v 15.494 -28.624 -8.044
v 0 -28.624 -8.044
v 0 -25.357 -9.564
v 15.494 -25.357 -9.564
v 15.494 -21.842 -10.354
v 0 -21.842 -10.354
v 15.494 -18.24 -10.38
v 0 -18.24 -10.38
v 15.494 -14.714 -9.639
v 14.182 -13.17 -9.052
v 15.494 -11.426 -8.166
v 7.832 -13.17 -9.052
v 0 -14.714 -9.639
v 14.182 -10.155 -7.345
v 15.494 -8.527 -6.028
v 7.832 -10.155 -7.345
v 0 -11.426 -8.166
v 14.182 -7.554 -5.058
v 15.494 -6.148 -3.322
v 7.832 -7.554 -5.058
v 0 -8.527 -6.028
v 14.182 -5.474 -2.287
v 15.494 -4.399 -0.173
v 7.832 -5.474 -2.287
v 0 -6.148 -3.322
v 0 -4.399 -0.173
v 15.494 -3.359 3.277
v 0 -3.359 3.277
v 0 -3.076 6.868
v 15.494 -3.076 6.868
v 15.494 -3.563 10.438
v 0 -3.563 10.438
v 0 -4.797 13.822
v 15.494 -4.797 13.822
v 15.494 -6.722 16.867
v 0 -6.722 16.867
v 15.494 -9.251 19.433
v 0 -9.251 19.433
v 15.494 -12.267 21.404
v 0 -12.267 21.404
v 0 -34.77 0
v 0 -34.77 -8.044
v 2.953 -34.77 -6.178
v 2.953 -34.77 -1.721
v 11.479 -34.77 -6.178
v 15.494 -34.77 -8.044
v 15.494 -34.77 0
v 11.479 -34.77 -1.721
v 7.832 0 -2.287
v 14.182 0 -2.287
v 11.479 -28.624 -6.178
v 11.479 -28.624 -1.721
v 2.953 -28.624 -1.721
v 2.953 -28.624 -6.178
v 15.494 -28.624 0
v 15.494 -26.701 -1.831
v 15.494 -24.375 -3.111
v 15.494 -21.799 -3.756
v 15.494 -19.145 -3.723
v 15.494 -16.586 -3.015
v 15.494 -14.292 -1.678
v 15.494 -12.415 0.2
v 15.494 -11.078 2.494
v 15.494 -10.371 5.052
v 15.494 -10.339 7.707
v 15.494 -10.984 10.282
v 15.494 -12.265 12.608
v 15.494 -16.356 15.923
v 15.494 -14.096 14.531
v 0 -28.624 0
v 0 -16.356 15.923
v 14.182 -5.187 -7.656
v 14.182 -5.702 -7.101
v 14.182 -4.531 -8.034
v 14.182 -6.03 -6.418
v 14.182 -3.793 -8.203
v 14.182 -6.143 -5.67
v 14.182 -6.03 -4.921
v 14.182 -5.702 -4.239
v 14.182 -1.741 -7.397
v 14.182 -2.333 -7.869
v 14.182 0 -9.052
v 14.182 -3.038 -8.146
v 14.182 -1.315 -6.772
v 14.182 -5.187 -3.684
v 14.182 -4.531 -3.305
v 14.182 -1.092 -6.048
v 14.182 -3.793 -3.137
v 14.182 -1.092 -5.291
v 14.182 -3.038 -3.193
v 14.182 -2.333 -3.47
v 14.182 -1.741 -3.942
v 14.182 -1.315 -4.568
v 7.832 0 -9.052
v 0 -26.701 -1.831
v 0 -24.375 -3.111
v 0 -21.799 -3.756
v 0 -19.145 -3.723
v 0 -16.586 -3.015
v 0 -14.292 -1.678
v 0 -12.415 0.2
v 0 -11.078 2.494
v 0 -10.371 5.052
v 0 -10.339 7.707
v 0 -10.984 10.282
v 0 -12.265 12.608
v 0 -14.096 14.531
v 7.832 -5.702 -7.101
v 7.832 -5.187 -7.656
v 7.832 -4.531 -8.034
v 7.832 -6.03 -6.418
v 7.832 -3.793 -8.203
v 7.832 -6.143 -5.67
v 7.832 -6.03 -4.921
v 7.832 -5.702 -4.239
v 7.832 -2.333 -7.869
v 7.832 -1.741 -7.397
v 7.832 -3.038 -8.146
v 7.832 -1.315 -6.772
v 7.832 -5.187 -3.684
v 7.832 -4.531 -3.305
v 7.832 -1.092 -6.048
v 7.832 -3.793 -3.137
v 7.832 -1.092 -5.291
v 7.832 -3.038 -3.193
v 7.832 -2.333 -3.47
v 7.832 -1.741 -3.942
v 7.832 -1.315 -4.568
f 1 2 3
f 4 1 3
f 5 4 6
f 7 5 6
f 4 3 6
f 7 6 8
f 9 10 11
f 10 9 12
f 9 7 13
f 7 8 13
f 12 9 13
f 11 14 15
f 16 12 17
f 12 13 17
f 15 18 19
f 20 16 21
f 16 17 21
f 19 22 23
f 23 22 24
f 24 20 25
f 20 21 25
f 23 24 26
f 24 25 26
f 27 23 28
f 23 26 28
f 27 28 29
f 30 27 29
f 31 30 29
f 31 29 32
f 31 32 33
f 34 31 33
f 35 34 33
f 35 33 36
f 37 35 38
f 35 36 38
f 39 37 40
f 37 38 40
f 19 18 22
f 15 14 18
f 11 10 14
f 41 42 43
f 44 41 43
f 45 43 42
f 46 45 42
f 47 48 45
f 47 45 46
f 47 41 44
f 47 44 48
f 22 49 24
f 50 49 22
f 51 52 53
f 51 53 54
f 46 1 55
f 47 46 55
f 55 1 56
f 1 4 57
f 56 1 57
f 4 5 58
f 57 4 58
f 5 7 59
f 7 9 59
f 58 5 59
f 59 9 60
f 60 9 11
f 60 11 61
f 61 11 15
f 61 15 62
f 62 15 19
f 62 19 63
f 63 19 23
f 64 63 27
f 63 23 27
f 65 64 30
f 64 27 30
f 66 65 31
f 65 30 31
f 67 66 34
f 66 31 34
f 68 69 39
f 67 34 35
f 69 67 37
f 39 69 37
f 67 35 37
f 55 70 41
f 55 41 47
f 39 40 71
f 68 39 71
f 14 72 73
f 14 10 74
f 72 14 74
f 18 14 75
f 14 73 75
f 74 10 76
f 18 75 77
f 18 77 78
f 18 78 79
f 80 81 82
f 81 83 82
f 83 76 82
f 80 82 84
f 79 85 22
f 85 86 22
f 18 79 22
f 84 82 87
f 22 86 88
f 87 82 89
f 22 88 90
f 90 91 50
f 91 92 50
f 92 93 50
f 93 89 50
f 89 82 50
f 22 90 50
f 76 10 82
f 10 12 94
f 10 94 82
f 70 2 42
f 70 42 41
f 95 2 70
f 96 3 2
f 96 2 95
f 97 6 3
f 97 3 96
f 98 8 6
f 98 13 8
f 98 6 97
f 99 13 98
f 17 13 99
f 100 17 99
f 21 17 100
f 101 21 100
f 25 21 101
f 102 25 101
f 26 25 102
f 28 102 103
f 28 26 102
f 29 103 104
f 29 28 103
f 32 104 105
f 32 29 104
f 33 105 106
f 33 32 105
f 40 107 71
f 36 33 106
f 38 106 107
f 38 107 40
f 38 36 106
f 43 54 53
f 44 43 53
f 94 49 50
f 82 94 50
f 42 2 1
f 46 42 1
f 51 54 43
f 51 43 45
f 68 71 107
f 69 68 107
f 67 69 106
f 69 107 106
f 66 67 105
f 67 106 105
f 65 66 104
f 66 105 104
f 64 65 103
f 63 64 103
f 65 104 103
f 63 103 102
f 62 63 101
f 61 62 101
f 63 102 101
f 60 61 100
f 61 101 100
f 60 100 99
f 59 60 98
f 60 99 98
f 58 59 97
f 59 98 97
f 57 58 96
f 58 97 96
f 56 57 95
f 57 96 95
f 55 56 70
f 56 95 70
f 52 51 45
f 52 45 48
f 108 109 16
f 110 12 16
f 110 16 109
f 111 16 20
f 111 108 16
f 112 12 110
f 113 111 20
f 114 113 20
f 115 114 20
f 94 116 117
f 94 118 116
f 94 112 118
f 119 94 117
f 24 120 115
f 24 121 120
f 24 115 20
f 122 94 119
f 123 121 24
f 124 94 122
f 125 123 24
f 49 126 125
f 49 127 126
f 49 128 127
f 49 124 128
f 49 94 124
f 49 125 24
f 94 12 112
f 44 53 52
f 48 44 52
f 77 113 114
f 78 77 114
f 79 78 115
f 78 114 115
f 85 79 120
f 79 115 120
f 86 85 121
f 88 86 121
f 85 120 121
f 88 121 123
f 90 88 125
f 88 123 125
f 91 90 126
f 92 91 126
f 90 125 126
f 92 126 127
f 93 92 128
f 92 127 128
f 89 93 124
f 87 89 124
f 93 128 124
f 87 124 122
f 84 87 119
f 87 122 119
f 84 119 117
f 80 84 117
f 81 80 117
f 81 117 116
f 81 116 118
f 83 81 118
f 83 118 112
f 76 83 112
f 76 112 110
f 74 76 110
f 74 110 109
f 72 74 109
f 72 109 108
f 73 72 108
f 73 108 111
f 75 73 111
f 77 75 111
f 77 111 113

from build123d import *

# Parameters (mm, degrees)
F1_DEPTH = 15.494
F2_W     = 6.349988
F2_H     = 6.764519
F3_DEPTH = 13.208
F5_D     = 5.08
F6_W     = 15.494
F6_H     = 8.044068
F6_W_2   = 8.525903
F6_H_2   = 4.456614
F7_DEPTH = 6.1468


with BuildPart() as f1:
    # F0 (on Right) → F1 (new body)
    with BuildSketch(Plane.YZ):
        with BuildLine():
            ThreePointArc((-16.356304, 15.922897), (-12.415087, 0.19965), (-28.623536, 0))
            Line((-28.623536, 0), (-28.623536, -8.044068))
            ThreePointArc((-28.623536, -8.044068), (-5.189303, -1.794092), (-12.267232, 21.403503))
            Line((-12.267232, 21.403503), (-16.356304, 15.922897))
        make_face()
    extrude(amount=F1_DEPTH)

    # F2 (on Front) → F3 (join)
    with BuildSketch(Plane.XZ):
        with Locations((11.007179, -5.669695)):
            Rectangle(F2_W, F2_H)
    extrude(amount=F3_DEPTH)

    # F5 (through all)
    with Locations(Plane.YZ.offset(14.182173)):
        with Locations((-3.603312, -5.669695)):
            Hole(F5_D / 2)

    # F6 (on face) → F7 (join)
    with BuildSketch(Plane.XZ.offset(28.623536)):
        with Locations((7.747, -4.022034)):
            Rectangle(F6_W, F6_H)
        with Locations((7.216052, -3.949209)):
            Rectangle(F6_W_2, F6_H_2, mode=Mode.SUBTRACT)
    extrude(amount=F7_DEPTH)


solid = f1.part
